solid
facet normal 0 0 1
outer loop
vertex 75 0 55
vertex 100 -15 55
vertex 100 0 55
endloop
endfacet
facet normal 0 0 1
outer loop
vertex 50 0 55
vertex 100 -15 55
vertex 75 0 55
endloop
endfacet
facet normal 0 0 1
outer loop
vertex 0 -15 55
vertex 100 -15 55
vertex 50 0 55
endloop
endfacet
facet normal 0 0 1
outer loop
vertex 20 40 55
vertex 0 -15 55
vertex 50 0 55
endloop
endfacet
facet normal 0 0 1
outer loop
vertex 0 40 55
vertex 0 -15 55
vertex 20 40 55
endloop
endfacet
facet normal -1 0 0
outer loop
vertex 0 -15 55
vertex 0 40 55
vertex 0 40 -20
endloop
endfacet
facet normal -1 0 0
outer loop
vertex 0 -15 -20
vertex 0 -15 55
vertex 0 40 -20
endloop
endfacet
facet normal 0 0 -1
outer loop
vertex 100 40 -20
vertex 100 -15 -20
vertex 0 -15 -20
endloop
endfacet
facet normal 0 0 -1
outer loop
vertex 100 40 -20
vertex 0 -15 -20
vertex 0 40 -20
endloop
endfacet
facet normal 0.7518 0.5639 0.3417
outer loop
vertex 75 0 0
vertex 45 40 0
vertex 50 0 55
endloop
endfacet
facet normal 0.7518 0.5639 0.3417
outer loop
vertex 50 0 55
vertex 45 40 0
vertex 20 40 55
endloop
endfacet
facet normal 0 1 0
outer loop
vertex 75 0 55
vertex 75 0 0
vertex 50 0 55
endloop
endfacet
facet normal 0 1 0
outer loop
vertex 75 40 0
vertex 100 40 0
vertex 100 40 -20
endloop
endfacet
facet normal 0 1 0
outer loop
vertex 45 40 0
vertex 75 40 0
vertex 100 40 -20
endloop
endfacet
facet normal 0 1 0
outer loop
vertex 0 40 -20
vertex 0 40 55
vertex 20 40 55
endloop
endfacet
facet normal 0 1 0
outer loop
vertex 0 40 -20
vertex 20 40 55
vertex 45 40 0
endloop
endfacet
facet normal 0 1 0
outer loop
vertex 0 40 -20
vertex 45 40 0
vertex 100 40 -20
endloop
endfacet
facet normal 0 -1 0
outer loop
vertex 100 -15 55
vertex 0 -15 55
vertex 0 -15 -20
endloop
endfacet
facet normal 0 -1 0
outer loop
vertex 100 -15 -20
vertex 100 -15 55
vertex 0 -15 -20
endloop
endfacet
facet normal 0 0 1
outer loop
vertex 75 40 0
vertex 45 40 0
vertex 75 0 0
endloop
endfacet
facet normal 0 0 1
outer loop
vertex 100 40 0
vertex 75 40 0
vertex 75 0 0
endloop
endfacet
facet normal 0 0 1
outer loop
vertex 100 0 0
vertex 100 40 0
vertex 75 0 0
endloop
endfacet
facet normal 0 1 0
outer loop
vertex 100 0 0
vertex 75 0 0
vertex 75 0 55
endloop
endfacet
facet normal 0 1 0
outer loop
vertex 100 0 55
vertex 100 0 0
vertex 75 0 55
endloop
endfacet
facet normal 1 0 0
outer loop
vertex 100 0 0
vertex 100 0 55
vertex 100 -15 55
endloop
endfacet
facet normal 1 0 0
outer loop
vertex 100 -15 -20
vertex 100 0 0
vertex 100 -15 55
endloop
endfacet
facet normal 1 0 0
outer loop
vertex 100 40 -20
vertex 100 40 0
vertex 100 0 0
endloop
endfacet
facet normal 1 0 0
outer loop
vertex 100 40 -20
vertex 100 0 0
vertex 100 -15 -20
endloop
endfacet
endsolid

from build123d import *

# Parameters (mm, degrees)
BOSS_EXTRUDE1_DEPTH = 100
SKETCH1_3_W         = 55
SKETCH1_3_H         = 40
BOSS_EXTRUDE2_DEPTH = 75
CUT_EXTRUDE1_DEPTH  = 75


with BuildPart() as part:
    # Sketch1 → Boss-Extrude1 (new body)
    with BuildSketch(Plane(origin=(0, 0, 0), x_dir=(0, 0, -1), z_dir=(1, 0, 0))):
        Polygon((20, 40), (0, 40), (0, 0), (-55, 0), (-55, -15), (20, -15), align=None)
    extrude(amount=BOSS_EXTRUDE1_DEPTH)

    # Sketch1<3> → Boss-Extrude2 (add)
    with BuildSketch(Plane(origin=(0, 0, 0), x_dir=(0, 0, -1), z_dir=(1, 0, 0))):
        with Locations((-27.5, 20)):
            Rectangle(SKETCH1_3_W, SKETCH1_3_H)
    extrude(amount=BOSS_EXTRUDE2_DEPTH)

    # Sketch4 → Cut-Extrude1 (cut, along a direction that is not the sketch's normal)
    with BuildSketch(Plane(origin=(42.394160584, 31.795620438, 19.270072993), x_dir=(-0.27339445046936345, -0.20504583785202254, 0.9397934234884372), z_dir=(-0.7518347387907499, -0.5638760540930621, -0.34174306308670427))):
        Polygon((38.018915768, 20), (-20.504583785, 5), (-20.504583785, -45), (38.018915768, -30), align=None)
    extrude(amount=-CUT_EXTRUDE1_DEPTH, dir=(-1, 0, 0), mode=Mode.SUBTRACT)


solid = part.part
